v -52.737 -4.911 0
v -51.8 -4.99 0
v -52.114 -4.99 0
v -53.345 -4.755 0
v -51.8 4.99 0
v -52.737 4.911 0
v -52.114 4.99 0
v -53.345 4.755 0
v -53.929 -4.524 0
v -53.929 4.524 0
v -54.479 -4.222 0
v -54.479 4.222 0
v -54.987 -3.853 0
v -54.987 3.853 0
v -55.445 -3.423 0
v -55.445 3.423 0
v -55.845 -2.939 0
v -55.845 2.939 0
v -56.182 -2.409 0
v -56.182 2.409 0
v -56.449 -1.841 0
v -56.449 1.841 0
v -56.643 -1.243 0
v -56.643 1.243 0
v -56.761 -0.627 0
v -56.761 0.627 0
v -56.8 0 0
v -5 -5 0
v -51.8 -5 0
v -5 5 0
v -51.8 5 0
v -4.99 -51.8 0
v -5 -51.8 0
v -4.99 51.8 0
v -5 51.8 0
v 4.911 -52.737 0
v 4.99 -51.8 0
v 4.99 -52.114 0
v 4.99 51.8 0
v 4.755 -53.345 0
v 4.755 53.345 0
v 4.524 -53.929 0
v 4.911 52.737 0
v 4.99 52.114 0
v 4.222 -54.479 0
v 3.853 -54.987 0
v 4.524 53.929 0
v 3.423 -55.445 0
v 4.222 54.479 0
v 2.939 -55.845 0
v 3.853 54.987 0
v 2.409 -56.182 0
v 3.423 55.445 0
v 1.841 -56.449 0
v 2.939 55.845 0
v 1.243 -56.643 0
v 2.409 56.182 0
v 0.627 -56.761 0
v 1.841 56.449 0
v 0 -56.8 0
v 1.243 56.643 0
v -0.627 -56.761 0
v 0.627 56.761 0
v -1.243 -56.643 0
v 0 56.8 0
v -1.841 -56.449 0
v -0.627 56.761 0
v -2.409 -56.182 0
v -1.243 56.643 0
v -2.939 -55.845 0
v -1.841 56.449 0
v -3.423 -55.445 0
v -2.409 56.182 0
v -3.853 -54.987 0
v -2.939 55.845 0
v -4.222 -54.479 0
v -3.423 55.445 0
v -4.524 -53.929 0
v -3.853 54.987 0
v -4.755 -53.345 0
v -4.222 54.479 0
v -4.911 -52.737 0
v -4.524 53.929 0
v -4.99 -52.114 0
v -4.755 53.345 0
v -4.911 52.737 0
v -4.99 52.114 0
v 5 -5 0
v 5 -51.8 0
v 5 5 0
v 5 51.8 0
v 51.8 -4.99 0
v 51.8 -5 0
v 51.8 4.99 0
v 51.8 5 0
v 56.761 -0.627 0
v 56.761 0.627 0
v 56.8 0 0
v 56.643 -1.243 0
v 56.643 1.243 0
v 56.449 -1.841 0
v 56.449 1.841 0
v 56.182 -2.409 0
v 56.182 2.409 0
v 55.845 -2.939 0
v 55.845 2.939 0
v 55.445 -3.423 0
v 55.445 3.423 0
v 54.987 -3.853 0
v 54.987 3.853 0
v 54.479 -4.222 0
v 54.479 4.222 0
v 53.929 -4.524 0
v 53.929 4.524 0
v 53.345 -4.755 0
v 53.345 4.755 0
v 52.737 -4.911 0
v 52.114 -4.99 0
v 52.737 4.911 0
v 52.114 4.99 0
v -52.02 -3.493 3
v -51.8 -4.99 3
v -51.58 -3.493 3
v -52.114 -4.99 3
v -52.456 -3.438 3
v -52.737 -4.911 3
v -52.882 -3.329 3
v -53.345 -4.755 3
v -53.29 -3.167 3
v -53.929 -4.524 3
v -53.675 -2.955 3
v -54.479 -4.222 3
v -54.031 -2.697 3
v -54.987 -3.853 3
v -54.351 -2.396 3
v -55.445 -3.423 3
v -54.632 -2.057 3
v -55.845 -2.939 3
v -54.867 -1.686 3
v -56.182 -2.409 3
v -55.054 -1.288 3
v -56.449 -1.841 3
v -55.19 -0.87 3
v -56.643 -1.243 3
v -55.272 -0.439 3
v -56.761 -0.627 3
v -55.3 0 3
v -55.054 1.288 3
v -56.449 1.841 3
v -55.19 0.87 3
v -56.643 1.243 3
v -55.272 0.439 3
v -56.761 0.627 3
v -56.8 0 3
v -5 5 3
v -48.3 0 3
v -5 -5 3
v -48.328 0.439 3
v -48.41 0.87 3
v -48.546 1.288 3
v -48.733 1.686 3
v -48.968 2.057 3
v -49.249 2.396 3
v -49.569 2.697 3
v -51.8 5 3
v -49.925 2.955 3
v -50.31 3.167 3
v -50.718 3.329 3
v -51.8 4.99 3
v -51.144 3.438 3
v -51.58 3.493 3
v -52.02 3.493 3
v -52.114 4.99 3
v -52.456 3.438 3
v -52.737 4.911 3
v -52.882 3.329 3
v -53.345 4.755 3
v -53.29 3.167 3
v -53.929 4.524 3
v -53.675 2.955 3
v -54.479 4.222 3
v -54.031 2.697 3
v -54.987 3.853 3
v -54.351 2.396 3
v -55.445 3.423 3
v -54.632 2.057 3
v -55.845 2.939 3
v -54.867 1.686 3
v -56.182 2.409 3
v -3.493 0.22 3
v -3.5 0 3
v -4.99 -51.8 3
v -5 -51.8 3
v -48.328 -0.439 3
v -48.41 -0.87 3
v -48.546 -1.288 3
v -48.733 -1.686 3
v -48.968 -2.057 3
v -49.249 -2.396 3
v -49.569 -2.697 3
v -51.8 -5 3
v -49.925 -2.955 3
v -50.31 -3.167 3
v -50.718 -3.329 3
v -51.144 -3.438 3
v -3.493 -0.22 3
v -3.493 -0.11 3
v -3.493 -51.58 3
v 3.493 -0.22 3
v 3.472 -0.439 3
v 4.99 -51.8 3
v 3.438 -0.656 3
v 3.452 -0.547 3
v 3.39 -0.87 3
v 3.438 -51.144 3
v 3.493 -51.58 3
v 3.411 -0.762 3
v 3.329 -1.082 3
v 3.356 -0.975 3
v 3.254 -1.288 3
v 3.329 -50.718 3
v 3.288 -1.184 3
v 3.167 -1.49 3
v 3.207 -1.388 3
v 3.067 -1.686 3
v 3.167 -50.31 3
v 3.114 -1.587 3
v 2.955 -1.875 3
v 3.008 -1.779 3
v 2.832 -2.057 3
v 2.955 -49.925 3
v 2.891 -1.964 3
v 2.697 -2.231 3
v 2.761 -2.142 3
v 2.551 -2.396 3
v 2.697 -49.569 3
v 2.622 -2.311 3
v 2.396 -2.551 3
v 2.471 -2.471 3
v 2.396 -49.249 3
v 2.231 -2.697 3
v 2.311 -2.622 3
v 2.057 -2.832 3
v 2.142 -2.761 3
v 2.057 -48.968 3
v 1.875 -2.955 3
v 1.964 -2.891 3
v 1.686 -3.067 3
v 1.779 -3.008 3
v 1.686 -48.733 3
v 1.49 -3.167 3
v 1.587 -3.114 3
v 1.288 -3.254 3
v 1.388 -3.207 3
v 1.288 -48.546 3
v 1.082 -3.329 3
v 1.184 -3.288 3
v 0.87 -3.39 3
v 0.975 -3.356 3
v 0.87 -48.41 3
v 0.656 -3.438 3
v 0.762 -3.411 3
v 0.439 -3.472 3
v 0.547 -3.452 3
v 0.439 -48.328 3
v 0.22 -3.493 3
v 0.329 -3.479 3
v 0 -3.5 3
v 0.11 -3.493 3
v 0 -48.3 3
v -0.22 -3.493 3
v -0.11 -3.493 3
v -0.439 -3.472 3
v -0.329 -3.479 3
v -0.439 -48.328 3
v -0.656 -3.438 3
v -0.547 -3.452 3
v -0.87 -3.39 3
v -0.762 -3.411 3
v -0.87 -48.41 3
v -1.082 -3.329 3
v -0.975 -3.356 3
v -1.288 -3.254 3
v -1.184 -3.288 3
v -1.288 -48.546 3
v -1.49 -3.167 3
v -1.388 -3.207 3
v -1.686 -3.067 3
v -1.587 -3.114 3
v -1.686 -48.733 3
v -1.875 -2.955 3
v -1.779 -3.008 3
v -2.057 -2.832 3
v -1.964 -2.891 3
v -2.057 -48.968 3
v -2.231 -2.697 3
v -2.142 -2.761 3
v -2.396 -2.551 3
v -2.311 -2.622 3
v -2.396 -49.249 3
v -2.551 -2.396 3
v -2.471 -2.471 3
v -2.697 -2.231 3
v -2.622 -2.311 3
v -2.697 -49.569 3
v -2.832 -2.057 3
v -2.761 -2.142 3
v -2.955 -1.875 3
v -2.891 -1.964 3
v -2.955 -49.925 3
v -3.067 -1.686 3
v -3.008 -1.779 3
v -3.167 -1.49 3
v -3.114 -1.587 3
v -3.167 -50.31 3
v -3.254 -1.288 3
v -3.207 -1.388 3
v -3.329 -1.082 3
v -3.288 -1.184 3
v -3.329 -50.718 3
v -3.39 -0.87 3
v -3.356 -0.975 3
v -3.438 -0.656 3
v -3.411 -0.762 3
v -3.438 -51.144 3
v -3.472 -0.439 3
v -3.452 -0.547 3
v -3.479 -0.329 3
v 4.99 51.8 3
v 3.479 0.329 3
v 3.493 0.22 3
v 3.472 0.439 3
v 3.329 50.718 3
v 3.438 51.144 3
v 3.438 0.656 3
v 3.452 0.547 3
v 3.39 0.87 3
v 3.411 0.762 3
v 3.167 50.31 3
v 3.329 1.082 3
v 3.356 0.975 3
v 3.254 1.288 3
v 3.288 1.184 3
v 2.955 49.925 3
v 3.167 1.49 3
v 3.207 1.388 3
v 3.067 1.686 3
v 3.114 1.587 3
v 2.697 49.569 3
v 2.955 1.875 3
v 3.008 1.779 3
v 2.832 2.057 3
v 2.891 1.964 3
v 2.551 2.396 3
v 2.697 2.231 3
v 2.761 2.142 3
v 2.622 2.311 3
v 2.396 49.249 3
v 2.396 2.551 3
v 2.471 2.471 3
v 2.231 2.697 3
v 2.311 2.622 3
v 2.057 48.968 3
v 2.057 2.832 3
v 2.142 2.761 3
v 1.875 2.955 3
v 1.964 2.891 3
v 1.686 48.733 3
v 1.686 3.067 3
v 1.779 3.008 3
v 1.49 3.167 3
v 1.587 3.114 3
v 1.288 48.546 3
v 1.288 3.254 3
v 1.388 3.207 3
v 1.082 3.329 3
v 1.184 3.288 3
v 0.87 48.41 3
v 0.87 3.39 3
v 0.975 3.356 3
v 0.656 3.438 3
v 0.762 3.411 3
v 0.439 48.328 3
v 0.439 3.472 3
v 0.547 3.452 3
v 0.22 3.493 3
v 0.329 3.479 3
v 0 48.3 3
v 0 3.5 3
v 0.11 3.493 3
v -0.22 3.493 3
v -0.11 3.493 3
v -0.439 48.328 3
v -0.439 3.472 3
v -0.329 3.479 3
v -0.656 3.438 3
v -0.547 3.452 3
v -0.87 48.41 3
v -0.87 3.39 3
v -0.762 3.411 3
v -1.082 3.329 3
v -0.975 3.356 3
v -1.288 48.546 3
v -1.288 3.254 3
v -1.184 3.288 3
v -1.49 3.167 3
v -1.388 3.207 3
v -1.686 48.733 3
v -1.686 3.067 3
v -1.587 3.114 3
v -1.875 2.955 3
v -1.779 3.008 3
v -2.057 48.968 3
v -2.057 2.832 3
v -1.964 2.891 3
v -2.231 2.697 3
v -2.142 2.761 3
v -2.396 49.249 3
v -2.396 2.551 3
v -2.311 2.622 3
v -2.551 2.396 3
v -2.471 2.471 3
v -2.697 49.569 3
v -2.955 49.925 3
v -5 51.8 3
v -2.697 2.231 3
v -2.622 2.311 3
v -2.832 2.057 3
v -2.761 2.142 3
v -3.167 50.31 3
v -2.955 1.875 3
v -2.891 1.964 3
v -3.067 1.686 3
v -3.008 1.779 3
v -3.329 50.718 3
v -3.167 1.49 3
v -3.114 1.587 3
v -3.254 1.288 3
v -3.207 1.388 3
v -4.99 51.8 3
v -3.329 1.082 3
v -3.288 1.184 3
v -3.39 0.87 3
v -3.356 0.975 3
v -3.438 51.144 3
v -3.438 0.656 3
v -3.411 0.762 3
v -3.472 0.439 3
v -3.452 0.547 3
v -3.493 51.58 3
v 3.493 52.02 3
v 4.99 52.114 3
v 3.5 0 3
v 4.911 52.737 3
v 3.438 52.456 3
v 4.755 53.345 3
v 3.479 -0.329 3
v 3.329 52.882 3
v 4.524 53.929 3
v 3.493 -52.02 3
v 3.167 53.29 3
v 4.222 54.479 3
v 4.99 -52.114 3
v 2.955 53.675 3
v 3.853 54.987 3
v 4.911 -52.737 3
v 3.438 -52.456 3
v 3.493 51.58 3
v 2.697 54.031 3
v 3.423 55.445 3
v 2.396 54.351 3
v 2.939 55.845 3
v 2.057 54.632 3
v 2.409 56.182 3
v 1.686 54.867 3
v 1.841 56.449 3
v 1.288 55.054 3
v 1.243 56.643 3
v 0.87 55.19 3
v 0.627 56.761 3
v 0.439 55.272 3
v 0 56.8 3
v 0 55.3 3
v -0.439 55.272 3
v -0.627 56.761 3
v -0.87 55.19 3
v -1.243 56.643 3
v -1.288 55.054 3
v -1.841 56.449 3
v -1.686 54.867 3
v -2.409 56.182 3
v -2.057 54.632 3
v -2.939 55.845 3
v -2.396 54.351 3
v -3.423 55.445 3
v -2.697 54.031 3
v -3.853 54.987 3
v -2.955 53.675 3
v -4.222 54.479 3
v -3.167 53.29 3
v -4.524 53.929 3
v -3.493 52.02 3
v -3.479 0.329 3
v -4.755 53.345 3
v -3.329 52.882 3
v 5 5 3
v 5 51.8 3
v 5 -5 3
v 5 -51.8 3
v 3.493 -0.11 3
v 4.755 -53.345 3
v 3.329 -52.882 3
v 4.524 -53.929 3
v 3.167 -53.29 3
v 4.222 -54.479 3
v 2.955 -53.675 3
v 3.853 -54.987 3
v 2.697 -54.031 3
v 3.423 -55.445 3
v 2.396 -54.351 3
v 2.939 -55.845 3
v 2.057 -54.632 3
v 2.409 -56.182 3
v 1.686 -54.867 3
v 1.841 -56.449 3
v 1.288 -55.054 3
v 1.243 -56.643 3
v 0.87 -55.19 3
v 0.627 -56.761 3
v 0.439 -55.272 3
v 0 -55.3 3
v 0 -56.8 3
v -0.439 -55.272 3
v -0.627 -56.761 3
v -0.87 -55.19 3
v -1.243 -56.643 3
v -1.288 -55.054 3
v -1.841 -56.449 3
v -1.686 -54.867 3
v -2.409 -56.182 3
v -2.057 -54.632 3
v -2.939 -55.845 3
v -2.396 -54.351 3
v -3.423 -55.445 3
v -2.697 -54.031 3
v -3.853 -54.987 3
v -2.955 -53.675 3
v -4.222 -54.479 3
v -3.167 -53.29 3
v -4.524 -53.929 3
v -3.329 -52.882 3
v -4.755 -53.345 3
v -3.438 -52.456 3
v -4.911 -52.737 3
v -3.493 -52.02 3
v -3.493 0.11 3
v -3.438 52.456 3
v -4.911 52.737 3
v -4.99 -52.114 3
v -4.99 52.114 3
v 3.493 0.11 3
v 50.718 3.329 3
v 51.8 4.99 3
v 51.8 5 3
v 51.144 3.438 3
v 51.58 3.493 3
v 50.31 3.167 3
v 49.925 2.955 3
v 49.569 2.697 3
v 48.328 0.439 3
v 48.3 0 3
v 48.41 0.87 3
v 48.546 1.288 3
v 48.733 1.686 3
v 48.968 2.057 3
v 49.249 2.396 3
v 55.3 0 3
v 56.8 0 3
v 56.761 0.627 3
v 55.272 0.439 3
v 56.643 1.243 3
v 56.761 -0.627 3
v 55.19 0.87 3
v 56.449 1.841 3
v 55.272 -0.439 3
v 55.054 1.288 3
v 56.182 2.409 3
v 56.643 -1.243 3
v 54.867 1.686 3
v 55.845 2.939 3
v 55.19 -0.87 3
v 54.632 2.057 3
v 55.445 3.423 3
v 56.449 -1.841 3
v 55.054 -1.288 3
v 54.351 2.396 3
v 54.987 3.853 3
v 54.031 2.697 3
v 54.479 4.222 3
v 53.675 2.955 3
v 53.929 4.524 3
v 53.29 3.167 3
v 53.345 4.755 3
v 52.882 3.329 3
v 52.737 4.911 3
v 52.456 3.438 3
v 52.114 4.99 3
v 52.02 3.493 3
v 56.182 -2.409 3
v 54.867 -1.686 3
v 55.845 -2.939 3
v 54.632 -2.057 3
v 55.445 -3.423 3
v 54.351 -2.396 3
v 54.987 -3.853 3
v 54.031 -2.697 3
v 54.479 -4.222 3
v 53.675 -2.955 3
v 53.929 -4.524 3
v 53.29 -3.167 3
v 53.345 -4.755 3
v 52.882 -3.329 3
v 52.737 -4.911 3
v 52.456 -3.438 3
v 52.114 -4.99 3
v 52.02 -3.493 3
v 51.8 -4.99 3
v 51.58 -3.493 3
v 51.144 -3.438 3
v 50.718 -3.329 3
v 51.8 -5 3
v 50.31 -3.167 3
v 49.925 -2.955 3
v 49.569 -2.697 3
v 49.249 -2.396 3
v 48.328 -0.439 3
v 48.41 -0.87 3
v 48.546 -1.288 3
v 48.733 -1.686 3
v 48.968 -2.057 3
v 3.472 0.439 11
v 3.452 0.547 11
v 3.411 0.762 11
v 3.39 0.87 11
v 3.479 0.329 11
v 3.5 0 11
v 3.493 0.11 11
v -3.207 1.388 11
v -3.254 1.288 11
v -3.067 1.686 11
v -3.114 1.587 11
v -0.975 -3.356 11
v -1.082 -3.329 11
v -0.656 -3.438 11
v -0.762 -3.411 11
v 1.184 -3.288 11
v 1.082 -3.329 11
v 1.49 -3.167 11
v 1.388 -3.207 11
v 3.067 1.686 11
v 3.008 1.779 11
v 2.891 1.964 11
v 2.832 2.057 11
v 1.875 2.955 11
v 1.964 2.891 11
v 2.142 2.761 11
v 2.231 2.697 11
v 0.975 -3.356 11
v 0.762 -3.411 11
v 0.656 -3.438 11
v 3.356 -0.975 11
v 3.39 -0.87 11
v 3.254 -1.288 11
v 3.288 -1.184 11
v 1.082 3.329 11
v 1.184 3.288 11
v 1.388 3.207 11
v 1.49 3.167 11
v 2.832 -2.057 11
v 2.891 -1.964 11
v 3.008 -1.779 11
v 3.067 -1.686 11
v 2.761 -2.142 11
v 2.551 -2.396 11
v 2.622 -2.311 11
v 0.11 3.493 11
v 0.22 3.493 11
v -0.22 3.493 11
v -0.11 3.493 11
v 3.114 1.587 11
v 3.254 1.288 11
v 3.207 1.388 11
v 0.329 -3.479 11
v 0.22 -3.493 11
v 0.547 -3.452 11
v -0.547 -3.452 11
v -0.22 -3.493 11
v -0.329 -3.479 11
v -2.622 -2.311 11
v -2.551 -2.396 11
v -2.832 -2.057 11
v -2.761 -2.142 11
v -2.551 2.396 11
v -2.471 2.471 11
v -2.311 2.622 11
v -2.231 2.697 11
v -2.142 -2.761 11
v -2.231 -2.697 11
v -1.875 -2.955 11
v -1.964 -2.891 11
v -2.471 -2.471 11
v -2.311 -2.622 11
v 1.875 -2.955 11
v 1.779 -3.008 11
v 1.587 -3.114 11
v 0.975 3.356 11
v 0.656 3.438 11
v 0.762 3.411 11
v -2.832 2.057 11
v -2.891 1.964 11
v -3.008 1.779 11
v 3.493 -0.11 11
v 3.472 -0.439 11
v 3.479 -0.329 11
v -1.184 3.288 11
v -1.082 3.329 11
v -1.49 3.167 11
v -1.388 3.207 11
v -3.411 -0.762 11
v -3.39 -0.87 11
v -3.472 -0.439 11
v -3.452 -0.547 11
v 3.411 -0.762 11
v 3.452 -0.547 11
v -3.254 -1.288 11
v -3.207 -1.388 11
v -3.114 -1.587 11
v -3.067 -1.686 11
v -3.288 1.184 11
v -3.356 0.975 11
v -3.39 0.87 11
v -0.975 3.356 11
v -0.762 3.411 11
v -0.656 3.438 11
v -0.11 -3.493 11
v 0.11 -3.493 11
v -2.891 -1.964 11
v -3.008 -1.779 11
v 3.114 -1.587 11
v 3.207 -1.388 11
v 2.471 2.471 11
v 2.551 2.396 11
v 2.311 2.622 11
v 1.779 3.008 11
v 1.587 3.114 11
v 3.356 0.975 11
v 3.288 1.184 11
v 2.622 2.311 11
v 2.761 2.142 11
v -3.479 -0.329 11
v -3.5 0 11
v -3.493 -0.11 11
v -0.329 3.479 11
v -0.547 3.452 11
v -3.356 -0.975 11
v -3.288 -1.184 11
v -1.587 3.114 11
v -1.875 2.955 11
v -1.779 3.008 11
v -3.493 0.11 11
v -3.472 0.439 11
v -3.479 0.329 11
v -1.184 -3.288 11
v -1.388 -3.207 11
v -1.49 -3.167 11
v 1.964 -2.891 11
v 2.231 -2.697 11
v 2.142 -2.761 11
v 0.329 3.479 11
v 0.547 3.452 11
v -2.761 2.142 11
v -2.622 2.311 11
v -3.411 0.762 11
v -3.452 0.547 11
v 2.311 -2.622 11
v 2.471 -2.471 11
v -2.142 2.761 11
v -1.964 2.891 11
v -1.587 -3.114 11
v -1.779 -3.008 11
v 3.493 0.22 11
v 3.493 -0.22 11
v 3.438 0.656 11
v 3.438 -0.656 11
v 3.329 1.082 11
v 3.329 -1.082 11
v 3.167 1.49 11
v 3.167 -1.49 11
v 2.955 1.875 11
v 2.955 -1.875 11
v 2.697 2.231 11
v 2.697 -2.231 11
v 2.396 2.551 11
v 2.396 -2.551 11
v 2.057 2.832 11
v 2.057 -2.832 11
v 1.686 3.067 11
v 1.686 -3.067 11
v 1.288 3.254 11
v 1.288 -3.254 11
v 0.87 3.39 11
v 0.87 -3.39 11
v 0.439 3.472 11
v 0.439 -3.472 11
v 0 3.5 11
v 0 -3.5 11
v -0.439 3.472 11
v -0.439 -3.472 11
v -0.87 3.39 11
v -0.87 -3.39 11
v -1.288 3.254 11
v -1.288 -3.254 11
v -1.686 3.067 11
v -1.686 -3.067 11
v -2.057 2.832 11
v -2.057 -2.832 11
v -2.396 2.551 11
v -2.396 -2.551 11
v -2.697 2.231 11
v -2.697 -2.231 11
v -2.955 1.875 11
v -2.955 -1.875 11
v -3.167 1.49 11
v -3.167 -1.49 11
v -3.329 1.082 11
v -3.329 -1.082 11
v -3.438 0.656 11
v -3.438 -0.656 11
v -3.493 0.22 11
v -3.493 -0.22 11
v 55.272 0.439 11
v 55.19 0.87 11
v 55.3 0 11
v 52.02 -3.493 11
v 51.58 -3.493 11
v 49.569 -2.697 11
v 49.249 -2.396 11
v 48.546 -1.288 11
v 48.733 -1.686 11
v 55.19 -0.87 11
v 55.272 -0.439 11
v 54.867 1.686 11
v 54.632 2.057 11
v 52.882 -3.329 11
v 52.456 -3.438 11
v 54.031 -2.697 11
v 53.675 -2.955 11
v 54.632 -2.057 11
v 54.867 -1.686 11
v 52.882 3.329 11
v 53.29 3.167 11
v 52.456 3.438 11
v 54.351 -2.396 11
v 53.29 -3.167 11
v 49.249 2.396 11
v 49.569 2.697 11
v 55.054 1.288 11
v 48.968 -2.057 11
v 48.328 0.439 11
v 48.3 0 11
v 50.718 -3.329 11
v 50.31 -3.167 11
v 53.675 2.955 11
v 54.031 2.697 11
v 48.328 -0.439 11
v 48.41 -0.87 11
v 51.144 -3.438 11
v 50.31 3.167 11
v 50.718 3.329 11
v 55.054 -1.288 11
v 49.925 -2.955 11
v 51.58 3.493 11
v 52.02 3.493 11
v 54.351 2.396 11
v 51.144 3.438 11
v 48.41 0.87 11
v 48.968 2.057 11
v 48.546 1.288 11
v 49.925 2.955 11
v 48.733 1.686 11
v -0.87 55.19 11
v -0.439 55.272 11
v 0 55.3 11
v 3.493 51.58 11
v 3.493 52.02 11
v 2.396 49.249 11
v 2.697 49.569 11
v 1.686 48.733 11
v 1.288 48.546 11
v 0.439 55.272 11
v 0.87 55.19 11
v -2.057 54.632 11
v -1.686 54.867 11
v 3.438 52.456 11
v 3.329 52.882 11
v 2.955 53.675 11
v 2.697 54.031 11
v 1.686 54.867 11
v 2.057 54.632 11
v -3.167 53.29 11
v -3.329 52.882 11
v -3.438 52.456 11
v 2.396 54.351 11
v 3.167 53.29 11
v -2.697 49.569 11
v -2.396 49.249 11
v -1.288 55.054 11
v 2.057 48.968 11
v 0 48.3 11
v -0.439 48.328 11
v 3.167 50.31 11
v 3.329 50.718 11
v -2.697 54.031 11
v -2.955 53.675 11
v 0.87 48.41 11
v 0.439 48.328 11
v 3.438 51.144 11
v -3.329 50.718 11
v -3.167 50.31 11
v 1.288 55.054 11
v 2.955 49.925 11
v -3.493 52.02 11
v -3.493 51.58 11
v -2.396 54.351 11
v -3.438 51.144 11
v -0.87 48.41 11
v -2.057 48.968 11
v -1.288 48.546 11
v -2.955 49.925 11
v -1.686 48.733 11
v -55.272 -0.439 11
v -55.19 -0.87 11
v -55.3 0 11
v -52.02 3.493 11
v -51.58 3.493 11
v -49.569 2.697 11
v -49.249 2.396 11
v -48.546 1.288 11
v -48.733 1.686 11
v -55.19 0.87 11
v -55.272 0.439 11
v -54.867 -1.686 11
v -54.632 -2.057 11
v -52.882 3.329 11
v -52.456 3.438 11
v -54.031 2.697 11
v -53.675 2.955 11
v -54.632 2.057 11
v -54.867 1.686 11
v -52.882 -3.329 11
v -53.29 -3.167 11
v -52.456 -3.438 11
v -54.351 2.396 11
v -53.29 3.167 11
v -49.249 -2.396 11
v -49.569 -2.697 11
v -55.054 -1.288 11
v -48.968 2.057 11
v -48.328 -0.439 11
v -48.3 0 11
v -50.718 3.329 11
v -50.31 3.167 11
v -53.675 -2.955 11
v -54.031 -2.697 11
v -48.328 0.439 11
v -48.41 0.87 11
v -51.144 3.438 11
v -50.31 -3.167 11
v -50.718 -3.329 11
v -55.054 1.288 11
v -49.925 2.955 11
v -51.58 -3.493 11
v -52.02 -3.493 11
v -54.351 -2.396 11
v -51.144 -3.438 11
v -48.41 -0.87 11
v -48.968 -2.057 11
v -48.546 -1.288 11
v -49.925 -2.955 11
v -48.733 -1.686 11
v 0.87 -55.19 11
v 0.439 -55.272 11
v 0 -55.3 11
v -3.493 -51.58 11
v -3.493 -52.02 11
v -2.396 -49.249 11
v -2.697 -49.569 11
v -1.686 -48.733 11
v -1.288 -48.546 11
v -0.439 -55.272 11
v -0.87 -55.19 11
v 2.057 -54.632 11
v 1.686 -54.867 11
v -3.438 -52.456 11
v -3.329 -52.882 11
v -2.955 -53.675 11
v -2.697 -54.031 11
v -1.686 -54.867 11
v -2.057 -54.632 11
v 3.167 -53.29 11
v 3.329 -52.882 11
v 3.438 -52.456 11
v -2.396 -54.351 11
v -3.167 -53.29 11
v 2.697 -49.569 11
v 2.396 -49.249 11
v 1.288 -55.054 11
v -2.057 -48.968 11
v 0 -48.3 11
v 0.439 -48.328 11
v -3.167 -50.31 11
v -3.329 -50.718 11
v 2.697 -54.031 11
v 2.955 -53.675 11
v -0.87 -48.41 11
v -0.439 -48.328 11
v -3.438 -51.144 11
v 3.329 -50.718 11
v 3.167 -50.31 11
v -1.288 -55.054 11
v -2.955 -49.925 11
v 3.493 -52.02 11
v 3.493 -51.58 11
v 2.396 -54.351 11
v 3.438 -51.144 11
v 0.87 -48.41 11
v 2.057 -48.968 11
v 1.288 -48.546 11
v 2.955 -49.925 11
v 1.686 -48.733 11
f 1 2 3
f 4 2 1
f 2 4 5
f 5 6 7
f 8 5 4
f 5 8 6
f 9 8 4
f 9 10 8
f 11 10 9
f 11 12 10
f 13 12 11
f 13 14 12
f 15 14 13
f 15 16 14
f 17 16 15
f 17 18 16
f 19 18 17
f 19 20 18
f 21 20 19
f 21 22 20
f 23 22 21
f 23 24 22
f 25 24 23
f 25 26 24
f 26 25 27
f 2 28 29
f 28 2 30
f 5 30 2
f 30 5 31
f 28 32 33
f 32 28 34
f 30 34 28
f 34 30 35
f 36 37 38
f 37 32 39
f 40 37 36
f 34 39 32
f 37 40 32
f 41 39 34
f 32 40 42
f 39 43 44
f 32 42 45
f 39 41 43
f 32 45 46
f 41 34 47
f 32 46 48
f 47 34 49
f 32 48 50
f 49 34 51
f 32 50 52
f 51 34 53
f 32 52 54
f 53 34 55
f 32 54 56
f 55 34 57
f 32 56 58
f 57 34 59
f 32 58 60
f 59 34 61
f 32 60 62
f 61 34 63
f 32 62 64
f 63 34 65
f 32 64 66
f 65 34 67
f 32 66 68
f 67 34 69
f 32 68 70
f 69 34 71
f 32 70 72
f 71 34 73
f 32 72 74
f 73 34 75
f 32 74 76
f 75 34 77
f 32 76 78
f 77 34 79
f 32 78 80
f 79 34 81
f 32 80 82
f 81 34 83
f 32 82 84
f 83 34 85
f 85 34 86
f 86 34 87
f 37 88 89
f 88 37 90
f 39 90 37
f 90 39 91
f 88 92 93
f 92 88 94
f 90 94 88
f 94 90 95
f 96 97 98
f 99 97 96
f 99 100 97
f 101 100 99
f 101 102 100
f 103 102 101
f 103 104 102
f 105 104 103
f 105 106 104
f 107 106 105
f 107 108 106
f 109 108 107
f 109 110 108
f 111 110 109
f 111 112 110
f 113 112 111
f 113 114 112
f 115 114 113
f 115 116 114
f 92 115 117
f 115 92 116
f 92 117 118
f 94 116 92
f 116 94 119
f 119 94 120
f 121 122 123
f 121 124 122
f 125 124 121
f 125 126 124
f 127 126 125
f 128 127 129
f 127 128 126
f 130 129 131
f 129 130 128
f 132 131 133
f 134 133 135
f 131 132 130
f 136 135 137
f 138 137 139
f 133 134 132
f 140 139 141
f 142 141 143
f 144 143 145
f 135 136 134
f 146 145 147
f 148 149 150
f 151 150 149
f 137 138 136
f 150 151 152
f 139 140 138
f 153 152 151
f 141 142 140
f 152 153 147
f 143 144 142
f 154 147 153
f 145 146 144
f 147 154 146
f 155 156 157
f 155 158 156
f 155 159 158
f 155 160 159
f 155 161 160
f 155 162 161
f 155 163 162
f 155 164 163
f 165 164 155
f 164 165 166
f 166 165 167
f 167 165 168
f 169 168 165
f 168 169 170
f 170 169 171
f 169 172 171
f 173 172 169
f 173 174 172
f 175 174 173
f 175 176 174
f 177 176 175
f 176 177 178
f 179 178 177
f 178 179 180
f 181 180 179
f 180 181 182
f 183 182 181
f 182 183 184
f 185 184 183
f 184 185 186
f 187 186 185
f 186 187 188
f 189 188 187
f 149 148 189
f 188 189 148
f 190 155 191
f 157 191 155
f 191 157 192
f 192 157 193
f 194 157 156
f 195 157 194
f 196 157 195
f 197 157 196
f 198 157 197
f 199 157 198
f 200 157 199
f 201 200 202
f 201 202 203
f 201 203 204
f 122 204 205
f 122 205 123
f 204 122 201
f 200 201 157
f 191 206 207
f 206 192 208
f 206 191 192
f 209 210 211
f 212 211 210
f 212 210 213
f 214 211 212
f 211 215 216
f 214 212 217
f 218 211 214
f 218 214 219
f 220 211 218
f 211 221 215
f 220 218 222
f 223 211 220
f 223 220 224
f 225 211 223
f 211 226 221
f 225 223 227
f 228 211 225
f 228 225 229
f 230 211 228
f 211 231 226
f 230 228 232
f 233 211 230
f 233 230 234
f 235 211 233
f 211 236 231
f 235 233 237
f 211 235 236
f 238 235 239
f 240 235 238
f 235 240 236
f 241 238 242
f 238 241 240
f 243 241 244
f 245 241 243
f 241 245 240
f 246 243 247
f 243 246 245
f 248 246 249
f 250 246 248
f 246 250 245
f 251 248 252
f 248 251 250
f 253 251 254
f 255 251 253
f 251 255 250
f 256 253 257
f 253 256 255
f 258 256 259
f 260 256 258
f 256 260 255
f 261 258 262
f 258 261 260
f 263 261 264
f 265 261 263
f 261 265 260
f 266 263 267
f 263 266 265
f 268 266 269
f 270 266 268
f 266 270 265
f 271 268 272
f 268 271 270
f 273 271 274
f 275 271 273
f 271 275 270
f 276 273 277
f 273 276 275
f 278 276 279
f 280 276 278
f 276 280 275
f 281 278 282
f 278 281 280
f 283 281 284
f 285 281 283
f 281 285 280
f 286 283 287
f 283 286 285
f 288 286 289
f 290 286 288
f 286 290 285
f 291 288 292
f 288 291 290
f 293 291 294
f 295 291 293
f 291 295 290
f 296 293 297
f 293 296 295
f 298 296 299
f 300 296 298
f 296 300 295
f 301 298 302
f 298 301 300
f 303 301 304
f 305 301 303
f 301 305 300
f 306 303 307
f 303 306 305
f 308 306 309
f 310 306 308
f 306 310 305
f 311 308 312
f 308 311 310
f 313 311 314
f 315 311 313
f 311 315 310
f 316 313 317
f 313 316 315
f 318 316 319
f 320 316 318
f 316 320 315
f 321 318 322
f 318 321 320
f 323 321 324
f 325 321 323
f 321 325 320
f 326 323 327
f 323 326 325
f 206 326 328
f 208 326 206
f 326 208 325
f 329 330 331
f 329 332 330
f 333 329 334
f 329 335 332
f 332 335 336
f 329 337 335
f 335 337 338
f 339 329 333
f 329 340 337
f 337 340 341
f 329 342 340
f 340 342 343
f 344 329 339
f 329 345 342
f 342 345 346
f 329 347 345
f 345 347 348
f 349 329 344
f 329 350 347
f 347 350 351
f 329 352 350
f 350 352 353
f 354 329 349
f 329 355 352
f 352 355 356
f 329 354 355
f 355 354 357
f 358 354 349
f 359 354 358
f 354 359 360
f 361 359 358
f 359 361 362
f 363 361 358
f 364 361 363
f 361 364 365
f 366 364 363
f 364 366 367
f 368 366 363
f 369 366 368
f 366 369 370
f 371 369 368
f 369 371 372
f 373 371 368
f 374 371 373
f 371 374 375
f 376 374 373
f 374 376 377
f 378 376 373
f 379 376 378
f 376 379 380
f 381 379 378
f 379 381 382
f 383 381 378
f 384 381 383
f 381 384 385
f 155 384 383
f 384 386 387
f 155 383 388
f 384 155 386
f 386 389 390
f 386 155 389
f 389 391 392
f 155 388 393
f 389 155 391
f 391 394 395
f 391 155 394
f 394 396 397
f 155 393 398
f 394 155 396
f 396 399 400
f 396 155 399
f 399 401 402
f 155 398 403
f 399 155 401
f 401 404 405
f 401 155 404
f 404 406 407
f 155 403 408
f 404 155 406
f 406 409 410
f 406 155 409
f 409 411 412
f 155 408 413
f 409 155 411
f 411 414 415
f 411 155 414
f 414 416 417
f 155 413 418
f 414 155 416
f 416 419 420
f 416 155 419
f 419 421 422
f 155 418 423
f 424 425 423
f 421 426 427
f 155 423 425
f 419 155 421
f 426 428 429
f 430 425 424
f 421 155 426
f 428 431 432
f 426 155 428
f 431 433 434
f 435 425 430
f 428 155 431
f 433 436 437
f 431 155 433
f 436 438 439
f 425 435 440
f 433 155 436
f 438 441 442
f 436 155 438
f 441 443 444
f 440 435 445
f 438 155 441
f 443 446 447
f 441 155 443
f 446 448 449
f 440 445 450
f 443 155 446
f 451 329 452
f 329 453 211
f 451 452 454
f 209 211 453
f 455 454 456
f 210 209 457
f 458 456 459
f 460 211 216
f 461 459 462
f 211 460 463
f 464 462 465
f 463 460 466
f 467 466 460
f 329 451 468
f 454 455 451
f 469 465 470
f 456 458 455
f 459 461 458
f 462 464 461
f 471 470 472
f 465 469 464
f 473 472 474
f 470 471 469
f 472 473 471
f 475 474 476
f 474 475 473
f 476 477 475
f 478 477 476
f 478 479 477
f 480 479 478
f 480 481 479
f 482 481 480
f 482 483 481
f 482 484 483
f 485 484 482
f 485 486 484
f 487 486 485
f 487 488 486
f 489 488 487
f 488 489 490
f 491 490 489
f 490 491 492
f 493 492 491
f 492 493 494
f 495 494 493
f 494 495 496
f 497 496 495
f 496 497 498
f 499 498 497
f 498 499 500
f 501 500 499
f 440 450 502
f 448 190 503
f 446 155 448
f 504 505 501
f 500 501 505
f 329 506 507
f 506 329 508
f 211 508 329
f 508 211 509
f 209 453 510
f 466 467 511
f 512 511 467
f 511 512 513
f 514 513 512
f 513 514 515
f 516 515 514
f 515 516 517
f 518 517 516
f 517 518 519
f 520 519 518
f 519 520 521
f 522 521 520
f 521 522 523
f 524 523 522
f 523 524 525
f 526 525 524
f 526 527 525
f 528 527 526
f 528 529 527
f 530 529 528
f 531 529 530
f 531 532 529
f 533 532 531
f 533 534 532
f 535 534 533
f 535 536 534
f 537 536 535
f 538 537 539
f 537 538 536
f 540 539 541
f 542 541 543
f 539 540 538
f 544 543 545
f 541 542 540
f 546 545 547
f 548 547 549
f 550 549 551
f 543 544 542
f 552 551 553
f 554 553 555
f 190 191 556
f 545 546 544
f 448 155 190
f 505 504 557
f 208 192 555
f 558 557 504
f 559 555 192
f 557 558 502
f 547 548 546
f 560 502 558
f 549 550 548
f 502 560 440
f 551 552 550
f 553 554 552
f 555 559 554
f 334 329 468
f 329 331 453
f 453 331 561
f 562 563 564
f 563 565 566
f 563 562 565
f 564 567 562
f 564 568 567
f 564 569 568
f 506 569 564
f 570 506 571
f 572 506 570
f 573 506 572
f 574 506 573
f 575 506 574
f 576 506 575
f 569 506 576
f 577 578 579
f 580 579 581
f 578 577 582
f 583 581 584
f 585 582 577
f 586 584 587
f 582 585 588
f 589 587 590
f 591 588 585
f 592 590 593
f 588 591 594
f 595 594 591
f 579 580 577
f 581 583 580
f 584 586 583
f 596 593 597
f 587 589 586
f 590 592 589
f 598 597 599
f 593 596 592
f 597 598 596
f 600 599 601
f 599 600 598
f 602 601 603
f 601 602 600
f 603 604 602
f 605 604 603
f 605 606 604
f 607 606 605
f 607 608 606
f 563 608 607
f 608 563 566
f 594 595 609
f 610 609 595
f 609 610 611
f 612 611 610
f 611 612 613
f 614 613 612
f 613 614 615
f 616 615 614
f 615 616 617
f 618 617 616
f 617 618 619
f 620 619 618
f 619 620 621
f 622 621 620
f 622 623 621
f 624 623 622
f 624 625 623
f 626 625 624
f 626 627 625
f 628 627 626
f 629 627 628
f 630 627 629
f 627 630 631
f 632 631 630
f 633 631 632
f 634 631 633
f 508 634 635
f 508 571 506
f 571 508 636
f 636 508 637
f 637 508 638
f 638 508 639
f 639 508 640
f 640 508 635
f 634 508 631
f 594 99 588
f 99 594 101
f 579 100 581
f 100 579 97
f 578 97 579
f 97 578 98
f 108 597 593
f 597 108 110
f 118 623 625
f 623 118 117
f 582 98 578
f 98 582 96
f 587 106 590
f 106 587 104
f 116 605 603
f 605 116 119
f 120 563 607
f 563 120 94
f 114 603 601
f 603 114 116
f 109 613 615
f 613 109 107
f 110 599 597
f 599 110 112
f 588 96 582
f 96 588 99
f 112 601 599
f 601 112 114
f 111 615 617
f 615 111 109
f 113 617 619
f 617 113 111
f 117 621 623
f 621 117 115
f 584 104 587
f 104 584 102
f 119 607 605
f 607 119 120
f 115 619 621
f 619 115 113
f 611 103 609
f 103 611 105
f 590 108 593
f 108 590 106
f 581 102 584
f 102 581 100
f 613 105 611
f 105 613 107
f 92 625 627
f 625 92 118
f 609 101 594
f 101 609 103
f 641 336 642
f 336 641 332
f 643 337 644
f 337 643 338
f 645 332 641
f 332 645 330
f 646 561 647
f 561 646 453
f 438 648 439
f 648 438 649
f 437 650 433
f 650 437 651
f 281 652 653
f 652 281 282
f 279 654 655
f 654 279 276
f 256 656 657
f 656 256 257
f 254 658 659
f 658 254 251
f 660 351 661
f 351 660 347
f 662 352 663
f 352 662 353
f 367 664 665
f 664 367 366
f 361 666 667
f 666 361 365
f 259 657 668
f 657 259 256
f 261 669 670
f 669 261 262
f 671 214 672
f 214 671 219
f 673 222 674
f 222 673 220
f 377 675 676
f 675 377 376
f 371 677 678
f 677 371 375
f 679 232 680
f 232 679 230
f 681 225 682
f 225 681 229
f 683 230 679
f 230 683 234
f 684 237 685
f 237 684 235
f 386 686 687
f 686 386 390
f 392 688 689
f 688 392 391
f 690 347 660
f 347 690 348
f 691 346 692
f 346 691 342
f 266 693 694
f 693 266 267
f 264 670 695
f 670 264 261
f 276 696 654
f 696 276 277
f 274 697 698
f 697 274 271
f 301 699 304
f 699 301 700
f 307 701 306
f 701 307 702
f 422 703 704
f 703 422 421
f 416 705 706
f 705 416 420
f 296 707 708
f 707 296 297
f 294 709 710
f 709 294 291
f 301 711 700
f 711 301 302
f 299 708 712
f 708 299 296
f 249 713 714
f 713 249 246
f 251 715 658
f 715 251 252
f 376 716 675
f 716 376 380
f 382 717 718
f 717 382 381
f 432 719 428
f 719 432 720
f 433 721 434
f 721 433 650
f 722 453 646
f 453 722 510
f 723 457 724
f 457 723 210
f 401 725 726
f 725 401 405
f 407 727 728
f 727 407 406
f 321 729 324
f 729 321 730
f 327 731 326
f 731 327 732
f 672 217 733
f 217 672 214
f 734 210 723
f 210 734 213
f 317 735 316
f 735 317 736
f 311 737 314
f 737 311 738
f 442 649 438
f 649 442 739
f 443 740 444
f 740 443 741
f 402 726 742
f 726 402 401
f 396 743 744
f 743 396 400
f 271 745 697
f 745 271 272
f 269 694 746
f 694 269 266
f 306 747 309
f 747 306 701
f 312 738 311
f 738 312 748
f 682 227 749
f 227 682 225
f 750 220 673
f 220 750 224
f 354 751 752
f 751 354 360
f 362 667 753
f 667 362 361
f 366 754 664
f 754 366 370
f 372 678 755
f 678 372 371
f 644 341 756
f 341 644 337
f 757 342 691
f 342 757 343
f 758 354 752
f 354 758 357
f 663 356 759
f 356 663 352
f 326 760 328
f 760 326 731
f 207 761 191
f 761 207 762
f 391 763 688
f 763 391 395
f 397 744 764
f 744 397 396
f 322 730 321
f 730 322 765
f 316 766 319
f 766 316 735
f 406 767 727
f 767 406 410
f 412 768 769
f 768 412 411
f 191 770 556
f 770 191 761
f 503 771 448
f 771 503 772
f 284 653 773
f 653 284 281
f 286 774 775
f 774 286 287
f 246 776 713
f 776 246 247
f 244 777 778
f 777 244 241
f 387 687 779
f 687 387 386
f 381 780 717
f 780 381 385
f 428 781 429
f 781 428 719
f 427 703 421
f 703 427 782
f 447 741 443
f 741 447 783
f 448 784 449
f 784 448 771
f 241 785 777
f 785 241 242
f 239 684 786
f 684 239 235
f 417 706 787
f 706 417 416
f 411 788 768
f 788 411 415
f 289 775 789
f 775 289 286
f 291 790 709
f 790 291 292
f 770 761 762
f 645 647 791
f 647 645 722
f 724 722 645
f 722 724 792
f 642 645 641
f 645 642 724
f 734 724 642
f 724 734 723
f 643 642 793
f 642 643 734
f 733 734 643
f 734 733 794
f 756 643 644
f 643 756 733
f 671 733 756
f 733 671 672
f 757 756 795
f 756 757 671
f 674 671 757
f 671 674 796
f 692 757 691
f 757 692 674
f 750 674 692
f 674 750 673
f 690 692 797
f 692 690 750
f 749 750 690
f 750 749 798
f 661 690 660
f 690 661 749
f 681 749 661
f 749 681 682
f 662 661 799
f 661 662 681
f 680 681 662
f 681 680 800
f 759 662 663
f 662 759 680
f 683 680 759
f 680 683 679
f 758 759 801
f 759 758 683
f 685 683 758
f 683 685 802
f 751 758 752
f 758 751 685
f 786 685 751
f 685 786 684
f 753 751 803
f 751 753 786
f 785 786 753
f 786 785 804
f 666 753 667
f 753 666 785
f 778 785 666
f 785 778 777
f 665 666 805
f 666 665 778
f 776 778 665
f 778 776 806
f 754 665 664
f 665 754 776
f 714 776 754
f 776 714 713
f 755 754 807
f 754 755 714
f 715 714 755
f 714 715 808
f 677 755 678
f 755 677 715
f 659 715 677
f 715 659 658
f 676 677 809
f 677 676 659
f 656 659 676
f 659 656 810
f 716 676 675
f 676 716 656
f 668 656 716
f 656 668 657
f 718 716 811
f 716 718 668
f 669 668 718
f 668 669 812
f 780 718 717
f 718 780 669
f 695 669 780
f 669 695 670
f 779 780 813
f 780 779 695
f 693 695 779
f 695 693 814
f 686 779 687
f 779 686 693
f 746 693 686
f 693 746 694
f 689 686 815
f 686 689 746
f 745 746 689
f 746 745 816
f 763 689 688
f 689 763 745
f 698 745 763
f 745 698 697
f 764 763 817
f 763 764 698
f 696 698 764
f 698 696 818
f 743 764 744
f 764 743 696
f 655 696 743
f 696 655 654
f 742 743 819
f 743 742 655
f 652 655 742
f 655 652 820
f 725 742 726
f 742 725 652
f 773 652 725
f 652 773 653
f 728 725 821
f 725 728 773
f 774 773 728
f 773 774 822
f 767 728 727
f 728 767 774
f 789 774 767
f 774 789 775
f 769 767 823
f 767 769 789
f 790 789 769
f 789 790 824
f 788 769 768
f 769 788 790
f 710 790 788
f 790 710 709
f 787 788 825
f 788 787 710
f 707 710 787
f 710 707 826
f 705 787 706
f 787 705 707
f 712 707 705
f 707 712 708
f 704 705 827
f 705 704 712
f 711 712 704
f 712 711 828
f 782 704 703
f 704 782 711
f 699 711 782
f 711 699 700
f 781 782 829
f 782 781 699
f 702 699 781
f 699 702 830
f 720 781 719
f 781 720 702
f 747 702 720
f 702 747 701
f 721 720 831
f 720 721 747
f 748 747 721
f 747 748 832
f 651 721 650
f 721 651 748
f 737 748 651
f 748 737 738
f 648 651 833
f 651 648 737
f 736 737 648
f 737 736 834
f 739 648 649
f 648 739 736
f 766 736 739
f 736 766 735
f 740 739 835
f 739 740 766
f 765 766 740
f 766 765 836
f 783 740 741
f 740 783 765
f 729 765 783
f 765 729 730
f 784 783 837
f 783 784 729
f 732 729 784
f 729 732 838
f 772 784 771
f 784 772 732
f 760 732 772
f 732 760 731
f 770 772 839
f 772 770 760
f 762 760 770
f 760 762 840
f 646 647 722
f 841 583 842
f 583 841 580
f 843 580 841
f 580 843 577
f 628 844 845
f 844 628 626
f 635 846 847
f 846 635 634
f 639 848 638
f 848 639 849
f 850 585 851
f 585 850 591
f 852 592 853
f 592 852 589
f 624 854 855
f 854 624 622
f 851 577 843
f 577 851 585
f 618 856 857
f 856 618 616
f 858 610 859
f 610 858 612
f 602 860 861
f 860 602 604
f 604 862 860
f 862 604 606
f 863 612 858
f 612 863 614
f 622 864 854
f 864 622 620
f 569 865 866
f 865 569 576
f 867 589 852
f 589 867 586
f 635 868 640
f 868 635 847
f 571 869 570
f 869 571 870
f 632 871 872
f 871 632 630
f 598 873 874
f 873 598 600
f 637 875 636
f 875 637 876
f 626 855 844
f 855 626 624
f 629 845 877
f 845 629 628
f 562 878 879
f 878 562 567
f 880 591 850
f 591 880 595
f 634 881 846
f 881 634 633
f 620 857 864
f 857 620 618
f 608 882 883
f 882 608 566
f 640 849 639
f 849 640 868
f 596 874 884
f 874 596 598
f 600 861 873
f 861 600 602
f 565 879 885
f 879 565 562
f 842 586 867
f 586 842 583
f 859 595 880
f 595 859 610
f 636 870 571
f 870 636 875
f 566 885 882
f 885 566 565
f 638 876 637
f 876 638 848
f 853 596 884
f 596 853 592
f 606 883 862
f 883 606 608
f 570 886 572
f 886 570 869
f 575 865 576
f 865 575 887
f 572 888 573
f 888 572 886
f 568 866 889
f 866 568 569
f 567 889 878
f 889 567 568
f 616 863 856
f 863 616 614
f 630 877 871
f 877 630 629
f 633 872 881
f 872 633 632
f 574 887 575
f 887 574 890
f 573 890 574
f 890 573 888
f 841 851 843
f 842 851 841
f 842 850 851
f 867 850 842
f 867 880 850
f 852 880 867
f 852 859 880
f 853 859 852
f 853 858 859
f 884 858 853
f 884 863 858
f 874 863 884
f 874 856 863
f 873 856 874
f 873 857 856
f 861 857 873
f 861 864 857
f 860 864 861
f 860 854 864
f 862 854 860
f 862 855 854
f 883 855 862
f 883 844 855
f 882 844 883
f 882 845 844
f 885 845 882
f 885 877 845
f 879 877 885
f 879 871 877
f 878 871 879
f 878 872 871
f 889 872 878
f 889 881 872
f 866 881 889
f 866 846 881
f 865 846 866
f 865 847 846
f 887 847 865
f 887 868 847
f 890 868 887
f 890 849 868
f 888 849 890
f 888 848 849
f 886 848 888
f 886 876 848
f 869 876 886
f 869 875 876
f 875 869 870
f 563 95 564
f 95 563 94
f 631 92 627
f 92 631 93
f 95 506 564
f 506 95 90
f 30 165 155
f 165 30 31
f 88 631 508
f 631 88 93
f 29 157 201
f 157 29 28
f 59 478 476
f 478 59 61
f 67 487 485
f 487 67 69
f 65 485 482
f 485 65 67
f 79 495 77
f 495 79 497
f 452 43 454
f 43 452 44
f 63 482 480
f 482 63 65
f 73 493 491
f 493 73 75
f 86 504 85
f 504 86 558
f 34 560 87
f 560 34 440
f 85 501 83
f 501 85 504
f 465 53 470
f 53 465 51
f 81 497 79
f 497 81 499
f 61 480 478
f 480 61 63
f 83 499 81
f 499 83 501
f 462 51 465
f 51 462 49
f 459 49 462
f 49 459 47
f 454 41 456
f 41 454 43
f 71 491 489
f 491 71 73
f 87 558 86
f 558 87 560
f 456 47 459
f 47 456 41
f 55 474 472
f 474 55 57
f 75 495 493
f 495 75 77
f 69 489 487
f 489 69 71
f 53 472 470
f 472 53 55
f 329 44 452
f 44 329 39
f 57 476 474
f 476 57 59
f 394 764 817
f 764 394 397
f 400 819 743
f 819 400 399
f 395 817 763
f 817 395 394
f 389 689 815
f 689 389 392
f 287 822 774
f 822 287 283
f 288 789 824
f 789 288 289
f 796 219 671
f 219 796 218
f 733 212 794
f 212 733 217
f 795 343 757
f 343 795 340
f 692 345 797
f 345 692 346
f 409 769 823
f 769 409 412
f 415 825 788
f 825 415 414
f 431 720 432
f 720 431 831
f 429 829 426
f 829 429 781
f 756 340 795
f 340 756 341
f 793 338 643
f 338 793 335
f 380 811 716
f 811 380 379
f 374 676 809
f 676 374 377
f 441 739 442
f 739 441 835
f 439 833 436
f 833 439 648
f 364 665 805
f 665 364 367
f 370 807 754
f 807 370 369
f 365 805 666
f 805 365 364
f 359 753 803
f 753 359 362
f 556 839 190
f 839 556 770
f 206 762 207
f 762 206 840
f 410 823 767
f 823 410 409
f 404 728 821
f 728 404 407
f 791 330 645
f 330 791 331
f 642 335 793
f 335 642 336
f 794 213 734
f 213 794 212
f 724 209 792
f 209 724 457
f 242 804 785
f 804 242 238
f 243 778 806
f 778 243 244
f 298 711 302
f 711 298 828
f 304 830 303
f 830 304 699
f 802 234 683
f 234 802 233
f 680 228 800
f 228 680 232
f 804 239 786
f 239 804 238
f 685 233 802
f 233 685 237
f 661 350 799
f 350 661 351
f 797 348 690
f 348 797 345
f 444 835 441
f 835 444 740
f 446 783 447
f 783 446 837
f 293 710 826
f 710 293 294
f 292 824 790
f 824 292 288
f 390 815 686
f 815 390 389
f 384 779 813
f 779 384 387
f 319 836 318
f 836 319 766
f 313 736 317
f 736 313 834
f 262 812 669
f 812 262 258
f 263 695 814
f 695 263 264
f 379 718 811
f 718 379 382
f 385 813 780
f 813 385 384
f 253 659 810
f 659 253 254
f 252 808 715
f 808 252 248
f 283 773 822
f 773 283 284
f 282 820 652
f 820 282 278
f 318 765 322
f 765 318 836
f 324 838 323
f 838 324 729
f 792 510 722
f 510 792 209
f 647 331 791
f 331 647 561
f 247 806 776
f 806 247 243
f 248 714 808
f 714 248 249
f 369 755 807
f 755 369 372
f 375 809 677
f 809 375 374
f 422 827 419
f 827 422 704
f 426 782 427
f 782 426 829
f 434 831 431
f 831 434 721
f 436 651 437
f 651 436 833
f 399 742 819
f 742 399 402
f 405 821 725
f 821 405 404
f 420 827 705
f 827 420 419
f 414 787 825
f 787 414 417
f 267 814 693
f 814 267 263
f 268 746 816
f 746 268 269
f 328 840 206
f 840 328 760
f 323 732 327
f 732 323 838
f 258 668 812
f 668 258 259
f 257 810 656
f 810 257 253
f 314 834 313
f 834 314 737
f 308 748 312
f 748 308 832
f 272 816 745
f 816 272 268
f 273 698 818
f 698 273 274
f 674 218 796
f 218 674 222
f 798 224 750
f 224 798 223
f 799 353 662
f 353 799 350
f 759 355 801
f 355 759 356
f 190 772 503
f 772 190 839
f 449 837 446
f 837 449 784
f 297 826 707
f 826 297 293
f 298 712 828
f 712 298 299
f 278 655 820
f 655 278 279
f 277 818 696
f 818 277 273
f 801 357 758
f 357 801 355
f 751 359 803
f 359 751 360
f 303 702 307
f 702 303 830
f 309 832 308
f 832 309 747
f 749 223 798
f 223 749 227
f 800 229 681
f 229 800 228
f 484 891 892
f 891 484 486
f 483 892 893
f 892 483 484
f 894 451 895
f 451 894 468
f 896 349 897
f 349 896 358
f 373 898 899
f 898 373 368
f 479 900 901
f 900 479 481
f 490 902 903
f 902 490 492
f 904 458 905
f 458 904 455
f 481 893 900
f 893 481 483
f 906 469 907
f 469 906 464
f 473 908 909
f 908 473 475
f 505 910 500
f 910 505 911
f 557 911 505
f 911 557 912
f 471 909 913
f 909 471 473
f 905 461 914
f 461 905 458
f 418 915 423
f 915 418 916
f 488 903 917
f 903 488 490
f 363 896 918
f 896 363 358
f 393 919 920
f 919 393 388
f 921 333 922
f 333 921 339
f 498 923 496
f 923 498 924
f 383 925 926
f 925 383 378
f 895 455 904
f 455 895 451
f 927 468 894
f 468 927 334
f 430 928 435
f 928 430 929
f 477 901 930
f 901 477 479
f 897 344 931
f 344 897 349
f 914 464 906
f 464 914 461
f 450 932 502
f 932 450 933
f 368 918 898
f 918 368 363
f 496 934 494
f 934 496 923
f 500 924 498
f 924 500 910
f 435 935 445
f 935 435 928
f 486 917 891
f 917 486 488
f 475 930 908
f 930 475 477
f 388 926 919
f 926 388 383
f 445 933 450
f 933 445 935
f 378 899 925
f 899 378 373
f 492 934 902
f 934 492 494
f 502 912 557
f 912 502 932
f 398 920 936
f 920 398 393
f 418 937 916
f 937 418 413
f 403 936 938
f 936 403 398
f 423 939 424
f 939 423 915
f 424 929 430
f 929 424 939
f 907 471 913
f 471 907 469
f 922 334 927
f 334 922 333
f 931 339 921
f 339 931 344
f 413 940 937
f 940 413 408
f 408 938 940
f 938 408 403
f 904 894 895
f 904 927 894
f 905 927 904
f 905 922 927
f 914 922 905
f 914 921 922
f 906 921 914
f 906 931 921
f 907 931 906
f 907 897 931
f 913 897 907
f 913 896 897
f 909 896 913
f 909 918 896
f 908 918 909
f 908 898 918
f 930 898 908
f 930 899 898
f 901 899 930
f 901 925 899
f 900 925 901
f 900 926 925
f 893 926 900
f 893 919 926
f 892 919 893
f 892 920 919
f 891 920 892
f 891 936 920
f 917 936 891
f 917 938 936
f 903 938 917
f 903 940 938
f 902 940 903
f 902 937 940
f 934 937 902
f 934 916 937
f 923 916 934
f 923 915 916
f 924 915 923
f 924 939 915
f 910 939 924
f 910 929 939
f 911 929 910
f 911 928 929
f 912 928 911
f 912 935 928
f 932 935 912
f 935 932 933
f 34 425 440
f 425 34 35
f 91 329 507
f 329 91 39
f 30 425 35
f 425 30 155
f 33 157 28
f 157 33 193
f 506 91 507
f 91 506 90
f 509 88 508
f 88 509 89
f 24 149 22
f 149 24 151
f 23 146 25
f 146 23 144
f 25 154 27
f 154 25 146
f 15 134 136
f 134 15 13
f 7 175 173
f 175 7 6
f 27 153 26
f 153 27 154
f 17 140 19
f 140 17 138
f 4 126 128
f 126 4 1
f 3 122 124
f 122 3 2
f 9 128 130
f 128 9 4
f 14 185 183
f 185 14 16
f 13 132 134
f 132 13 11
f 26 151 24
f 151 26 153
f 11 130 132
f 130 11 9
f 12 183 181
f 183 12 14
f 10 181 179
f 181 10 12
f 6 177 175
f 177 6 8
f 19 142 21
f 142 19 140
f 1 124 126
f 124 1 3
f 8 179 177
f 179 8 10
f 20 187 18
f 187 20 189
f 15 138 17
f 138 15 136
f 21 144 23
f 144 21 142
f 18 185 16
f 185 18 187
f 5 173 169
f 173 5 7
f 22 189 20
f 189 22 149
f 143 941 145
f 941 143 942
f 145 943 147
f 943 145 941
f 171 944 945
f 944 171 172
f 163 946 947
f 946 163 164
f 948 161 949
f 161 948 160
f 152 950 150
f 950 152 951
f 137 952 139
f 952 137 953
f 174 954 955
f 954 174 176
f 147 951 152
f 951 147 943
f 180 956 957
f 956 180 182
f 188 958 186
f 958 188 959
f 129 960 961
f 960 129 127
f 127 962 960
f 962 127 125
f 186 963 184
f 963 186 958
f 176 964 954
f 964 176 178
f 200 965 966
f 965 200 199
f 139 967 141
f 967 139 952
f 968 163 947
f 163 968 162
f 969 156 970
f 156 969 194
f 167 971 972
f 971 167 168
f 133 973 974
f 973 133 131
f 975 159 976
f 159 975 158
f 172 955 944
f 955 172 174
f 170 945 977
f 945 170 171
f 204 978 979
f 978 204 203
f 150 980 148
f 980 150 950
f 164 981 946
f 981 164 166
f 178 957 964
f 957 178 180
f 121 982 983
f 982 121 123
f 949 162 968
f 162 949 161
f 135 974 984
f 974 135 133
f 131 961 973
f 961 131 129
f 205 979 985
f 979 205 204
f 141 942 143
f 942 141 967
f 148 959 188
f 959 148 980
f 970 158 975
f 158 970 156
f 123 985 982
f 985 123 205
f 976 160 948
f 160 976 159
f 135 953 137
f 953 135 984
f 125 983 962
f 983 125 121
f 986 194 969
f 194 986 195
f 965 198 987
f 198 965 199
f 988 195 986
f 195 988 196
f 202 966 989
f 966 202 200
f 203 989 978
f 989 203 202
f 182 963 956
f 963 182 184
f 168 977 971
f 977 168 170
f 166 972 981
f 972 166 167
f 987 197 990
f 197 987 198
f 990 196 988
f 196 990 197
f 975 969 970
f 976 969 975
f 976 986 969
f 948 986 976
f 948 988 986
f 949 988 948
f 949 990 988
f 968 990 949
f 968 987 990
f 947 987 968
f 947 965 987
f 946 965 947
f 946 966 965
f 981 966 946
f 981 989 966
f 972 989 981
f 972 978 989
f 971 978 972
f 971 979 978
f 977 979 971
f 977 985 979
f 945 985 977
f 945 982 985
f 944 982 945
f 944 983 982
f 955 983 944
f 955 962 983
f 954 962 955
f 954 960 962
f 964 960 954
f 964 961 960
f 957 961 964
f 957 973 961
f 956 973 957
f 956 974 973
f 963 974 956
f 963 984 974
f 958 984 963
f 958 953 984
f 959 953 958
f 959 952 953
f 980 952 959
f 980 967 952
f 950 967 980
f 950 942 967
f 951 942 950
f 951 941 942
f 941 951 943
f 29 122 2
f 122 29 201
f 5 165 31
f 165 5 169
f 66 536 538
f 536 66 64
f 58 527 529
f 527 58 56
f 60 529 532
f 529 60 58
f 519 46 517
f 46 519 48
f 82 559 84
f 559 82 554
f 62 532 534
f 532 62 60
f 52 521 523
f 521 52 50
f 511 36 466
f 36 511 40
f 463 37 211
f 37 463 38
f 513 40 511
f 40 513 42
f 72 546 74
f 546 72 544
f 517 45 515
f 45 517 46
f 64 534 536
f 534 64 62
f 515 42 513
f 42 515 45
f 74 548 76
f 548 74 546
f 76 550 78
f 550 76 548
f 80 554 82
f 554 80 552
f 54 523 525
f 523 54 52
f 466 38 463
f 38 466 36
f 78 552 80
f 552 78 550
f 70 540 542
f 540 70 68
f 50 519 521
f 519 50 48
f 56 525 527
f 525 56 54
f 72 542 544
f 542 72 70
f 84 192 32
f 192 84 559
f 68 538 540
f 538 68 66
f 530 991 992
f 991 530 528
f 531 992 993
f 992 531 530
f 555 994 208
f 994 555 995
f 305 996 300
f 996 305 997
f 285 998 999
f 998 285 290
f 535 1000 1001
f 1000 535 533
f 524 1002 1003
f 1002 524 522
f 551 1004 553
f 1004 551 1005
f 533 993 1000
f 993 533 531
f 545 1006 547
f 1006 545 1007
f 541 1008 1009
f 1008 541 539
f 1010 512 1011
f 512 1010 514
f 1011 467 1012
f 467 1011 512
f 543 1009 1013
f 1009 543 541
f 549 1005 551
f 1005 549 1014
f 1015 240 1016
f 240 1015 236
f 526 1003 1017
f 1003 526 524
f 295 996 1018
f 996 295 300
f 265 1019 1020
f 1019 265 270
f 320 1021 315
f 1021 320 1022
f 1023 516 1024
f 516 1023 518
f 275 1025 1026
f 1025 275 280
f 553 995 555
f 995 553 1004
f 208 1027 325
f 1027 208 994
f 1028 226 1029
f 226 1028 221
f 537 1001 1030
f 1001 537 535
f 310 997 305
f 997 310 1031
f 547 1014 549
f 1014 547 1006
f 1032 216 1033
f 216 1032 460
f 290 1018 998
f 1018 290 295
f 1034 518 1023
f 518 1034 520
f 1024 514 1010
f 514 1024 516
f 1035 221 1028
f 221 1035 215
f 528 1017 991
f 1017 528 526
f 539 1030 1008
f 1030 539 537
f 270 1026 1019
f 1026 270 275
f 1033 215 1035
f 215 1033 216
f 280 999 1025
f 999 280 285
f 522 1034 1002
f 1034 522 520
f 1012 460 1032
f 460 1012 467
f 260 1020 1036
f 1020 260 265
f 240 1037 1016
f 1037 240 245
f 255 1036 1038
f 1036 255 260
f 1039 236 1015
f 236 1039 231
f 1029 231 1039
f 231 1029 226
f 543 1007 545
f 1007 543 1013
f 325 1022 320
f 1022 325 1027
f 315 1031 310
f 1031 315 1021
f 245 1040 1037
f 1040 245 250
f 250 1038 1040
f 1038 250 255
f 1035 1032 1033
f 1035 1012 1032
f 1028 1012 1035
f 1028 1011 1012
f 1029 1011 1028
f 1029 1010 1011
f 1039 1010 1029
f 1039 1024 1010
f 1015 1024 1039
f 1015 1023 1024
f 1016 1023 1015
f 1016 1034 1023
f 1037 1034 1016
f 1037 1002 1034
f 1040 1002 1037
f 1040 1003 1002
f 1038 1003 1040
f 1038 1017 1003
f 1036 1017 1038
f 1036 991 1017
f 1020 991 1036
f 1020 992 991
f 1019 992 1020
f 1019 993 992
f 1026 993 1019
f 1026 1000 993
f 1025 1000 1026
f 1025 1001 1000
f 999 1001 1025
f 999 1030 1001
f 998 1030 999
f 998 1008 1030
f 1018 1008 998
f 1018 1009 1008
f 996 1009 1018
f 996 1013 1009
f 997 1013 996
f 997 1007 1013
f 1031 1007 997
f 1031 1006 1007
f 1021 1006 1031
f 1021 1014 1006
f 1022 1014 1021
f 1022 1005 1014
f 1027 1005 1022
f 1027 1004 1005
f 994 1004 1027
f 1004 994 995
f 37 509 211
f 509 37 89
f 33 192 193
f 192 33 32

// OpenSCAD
for (i = [0:3]){
	rotate(90*i, [0,0,1]){
		translate([-5,-5,0]){
			translate([5,0,0]){
				cube([51.8, 10, 3]);
			}
			translate([5,5,0]){
				cylinder(h=3, d=10, $fn=50);
				translate([51.8,0,0]){
					cylinder(h=3, d=10, $fn=50);
				}
			}
			translate([5,5,3]){
				cylinder(d=7, h=8, $fn=50);
				translate([51.8,0,0]){
					cylinder(d=7, h=8, $fn=50);
				}
			}
		}
	}
}
